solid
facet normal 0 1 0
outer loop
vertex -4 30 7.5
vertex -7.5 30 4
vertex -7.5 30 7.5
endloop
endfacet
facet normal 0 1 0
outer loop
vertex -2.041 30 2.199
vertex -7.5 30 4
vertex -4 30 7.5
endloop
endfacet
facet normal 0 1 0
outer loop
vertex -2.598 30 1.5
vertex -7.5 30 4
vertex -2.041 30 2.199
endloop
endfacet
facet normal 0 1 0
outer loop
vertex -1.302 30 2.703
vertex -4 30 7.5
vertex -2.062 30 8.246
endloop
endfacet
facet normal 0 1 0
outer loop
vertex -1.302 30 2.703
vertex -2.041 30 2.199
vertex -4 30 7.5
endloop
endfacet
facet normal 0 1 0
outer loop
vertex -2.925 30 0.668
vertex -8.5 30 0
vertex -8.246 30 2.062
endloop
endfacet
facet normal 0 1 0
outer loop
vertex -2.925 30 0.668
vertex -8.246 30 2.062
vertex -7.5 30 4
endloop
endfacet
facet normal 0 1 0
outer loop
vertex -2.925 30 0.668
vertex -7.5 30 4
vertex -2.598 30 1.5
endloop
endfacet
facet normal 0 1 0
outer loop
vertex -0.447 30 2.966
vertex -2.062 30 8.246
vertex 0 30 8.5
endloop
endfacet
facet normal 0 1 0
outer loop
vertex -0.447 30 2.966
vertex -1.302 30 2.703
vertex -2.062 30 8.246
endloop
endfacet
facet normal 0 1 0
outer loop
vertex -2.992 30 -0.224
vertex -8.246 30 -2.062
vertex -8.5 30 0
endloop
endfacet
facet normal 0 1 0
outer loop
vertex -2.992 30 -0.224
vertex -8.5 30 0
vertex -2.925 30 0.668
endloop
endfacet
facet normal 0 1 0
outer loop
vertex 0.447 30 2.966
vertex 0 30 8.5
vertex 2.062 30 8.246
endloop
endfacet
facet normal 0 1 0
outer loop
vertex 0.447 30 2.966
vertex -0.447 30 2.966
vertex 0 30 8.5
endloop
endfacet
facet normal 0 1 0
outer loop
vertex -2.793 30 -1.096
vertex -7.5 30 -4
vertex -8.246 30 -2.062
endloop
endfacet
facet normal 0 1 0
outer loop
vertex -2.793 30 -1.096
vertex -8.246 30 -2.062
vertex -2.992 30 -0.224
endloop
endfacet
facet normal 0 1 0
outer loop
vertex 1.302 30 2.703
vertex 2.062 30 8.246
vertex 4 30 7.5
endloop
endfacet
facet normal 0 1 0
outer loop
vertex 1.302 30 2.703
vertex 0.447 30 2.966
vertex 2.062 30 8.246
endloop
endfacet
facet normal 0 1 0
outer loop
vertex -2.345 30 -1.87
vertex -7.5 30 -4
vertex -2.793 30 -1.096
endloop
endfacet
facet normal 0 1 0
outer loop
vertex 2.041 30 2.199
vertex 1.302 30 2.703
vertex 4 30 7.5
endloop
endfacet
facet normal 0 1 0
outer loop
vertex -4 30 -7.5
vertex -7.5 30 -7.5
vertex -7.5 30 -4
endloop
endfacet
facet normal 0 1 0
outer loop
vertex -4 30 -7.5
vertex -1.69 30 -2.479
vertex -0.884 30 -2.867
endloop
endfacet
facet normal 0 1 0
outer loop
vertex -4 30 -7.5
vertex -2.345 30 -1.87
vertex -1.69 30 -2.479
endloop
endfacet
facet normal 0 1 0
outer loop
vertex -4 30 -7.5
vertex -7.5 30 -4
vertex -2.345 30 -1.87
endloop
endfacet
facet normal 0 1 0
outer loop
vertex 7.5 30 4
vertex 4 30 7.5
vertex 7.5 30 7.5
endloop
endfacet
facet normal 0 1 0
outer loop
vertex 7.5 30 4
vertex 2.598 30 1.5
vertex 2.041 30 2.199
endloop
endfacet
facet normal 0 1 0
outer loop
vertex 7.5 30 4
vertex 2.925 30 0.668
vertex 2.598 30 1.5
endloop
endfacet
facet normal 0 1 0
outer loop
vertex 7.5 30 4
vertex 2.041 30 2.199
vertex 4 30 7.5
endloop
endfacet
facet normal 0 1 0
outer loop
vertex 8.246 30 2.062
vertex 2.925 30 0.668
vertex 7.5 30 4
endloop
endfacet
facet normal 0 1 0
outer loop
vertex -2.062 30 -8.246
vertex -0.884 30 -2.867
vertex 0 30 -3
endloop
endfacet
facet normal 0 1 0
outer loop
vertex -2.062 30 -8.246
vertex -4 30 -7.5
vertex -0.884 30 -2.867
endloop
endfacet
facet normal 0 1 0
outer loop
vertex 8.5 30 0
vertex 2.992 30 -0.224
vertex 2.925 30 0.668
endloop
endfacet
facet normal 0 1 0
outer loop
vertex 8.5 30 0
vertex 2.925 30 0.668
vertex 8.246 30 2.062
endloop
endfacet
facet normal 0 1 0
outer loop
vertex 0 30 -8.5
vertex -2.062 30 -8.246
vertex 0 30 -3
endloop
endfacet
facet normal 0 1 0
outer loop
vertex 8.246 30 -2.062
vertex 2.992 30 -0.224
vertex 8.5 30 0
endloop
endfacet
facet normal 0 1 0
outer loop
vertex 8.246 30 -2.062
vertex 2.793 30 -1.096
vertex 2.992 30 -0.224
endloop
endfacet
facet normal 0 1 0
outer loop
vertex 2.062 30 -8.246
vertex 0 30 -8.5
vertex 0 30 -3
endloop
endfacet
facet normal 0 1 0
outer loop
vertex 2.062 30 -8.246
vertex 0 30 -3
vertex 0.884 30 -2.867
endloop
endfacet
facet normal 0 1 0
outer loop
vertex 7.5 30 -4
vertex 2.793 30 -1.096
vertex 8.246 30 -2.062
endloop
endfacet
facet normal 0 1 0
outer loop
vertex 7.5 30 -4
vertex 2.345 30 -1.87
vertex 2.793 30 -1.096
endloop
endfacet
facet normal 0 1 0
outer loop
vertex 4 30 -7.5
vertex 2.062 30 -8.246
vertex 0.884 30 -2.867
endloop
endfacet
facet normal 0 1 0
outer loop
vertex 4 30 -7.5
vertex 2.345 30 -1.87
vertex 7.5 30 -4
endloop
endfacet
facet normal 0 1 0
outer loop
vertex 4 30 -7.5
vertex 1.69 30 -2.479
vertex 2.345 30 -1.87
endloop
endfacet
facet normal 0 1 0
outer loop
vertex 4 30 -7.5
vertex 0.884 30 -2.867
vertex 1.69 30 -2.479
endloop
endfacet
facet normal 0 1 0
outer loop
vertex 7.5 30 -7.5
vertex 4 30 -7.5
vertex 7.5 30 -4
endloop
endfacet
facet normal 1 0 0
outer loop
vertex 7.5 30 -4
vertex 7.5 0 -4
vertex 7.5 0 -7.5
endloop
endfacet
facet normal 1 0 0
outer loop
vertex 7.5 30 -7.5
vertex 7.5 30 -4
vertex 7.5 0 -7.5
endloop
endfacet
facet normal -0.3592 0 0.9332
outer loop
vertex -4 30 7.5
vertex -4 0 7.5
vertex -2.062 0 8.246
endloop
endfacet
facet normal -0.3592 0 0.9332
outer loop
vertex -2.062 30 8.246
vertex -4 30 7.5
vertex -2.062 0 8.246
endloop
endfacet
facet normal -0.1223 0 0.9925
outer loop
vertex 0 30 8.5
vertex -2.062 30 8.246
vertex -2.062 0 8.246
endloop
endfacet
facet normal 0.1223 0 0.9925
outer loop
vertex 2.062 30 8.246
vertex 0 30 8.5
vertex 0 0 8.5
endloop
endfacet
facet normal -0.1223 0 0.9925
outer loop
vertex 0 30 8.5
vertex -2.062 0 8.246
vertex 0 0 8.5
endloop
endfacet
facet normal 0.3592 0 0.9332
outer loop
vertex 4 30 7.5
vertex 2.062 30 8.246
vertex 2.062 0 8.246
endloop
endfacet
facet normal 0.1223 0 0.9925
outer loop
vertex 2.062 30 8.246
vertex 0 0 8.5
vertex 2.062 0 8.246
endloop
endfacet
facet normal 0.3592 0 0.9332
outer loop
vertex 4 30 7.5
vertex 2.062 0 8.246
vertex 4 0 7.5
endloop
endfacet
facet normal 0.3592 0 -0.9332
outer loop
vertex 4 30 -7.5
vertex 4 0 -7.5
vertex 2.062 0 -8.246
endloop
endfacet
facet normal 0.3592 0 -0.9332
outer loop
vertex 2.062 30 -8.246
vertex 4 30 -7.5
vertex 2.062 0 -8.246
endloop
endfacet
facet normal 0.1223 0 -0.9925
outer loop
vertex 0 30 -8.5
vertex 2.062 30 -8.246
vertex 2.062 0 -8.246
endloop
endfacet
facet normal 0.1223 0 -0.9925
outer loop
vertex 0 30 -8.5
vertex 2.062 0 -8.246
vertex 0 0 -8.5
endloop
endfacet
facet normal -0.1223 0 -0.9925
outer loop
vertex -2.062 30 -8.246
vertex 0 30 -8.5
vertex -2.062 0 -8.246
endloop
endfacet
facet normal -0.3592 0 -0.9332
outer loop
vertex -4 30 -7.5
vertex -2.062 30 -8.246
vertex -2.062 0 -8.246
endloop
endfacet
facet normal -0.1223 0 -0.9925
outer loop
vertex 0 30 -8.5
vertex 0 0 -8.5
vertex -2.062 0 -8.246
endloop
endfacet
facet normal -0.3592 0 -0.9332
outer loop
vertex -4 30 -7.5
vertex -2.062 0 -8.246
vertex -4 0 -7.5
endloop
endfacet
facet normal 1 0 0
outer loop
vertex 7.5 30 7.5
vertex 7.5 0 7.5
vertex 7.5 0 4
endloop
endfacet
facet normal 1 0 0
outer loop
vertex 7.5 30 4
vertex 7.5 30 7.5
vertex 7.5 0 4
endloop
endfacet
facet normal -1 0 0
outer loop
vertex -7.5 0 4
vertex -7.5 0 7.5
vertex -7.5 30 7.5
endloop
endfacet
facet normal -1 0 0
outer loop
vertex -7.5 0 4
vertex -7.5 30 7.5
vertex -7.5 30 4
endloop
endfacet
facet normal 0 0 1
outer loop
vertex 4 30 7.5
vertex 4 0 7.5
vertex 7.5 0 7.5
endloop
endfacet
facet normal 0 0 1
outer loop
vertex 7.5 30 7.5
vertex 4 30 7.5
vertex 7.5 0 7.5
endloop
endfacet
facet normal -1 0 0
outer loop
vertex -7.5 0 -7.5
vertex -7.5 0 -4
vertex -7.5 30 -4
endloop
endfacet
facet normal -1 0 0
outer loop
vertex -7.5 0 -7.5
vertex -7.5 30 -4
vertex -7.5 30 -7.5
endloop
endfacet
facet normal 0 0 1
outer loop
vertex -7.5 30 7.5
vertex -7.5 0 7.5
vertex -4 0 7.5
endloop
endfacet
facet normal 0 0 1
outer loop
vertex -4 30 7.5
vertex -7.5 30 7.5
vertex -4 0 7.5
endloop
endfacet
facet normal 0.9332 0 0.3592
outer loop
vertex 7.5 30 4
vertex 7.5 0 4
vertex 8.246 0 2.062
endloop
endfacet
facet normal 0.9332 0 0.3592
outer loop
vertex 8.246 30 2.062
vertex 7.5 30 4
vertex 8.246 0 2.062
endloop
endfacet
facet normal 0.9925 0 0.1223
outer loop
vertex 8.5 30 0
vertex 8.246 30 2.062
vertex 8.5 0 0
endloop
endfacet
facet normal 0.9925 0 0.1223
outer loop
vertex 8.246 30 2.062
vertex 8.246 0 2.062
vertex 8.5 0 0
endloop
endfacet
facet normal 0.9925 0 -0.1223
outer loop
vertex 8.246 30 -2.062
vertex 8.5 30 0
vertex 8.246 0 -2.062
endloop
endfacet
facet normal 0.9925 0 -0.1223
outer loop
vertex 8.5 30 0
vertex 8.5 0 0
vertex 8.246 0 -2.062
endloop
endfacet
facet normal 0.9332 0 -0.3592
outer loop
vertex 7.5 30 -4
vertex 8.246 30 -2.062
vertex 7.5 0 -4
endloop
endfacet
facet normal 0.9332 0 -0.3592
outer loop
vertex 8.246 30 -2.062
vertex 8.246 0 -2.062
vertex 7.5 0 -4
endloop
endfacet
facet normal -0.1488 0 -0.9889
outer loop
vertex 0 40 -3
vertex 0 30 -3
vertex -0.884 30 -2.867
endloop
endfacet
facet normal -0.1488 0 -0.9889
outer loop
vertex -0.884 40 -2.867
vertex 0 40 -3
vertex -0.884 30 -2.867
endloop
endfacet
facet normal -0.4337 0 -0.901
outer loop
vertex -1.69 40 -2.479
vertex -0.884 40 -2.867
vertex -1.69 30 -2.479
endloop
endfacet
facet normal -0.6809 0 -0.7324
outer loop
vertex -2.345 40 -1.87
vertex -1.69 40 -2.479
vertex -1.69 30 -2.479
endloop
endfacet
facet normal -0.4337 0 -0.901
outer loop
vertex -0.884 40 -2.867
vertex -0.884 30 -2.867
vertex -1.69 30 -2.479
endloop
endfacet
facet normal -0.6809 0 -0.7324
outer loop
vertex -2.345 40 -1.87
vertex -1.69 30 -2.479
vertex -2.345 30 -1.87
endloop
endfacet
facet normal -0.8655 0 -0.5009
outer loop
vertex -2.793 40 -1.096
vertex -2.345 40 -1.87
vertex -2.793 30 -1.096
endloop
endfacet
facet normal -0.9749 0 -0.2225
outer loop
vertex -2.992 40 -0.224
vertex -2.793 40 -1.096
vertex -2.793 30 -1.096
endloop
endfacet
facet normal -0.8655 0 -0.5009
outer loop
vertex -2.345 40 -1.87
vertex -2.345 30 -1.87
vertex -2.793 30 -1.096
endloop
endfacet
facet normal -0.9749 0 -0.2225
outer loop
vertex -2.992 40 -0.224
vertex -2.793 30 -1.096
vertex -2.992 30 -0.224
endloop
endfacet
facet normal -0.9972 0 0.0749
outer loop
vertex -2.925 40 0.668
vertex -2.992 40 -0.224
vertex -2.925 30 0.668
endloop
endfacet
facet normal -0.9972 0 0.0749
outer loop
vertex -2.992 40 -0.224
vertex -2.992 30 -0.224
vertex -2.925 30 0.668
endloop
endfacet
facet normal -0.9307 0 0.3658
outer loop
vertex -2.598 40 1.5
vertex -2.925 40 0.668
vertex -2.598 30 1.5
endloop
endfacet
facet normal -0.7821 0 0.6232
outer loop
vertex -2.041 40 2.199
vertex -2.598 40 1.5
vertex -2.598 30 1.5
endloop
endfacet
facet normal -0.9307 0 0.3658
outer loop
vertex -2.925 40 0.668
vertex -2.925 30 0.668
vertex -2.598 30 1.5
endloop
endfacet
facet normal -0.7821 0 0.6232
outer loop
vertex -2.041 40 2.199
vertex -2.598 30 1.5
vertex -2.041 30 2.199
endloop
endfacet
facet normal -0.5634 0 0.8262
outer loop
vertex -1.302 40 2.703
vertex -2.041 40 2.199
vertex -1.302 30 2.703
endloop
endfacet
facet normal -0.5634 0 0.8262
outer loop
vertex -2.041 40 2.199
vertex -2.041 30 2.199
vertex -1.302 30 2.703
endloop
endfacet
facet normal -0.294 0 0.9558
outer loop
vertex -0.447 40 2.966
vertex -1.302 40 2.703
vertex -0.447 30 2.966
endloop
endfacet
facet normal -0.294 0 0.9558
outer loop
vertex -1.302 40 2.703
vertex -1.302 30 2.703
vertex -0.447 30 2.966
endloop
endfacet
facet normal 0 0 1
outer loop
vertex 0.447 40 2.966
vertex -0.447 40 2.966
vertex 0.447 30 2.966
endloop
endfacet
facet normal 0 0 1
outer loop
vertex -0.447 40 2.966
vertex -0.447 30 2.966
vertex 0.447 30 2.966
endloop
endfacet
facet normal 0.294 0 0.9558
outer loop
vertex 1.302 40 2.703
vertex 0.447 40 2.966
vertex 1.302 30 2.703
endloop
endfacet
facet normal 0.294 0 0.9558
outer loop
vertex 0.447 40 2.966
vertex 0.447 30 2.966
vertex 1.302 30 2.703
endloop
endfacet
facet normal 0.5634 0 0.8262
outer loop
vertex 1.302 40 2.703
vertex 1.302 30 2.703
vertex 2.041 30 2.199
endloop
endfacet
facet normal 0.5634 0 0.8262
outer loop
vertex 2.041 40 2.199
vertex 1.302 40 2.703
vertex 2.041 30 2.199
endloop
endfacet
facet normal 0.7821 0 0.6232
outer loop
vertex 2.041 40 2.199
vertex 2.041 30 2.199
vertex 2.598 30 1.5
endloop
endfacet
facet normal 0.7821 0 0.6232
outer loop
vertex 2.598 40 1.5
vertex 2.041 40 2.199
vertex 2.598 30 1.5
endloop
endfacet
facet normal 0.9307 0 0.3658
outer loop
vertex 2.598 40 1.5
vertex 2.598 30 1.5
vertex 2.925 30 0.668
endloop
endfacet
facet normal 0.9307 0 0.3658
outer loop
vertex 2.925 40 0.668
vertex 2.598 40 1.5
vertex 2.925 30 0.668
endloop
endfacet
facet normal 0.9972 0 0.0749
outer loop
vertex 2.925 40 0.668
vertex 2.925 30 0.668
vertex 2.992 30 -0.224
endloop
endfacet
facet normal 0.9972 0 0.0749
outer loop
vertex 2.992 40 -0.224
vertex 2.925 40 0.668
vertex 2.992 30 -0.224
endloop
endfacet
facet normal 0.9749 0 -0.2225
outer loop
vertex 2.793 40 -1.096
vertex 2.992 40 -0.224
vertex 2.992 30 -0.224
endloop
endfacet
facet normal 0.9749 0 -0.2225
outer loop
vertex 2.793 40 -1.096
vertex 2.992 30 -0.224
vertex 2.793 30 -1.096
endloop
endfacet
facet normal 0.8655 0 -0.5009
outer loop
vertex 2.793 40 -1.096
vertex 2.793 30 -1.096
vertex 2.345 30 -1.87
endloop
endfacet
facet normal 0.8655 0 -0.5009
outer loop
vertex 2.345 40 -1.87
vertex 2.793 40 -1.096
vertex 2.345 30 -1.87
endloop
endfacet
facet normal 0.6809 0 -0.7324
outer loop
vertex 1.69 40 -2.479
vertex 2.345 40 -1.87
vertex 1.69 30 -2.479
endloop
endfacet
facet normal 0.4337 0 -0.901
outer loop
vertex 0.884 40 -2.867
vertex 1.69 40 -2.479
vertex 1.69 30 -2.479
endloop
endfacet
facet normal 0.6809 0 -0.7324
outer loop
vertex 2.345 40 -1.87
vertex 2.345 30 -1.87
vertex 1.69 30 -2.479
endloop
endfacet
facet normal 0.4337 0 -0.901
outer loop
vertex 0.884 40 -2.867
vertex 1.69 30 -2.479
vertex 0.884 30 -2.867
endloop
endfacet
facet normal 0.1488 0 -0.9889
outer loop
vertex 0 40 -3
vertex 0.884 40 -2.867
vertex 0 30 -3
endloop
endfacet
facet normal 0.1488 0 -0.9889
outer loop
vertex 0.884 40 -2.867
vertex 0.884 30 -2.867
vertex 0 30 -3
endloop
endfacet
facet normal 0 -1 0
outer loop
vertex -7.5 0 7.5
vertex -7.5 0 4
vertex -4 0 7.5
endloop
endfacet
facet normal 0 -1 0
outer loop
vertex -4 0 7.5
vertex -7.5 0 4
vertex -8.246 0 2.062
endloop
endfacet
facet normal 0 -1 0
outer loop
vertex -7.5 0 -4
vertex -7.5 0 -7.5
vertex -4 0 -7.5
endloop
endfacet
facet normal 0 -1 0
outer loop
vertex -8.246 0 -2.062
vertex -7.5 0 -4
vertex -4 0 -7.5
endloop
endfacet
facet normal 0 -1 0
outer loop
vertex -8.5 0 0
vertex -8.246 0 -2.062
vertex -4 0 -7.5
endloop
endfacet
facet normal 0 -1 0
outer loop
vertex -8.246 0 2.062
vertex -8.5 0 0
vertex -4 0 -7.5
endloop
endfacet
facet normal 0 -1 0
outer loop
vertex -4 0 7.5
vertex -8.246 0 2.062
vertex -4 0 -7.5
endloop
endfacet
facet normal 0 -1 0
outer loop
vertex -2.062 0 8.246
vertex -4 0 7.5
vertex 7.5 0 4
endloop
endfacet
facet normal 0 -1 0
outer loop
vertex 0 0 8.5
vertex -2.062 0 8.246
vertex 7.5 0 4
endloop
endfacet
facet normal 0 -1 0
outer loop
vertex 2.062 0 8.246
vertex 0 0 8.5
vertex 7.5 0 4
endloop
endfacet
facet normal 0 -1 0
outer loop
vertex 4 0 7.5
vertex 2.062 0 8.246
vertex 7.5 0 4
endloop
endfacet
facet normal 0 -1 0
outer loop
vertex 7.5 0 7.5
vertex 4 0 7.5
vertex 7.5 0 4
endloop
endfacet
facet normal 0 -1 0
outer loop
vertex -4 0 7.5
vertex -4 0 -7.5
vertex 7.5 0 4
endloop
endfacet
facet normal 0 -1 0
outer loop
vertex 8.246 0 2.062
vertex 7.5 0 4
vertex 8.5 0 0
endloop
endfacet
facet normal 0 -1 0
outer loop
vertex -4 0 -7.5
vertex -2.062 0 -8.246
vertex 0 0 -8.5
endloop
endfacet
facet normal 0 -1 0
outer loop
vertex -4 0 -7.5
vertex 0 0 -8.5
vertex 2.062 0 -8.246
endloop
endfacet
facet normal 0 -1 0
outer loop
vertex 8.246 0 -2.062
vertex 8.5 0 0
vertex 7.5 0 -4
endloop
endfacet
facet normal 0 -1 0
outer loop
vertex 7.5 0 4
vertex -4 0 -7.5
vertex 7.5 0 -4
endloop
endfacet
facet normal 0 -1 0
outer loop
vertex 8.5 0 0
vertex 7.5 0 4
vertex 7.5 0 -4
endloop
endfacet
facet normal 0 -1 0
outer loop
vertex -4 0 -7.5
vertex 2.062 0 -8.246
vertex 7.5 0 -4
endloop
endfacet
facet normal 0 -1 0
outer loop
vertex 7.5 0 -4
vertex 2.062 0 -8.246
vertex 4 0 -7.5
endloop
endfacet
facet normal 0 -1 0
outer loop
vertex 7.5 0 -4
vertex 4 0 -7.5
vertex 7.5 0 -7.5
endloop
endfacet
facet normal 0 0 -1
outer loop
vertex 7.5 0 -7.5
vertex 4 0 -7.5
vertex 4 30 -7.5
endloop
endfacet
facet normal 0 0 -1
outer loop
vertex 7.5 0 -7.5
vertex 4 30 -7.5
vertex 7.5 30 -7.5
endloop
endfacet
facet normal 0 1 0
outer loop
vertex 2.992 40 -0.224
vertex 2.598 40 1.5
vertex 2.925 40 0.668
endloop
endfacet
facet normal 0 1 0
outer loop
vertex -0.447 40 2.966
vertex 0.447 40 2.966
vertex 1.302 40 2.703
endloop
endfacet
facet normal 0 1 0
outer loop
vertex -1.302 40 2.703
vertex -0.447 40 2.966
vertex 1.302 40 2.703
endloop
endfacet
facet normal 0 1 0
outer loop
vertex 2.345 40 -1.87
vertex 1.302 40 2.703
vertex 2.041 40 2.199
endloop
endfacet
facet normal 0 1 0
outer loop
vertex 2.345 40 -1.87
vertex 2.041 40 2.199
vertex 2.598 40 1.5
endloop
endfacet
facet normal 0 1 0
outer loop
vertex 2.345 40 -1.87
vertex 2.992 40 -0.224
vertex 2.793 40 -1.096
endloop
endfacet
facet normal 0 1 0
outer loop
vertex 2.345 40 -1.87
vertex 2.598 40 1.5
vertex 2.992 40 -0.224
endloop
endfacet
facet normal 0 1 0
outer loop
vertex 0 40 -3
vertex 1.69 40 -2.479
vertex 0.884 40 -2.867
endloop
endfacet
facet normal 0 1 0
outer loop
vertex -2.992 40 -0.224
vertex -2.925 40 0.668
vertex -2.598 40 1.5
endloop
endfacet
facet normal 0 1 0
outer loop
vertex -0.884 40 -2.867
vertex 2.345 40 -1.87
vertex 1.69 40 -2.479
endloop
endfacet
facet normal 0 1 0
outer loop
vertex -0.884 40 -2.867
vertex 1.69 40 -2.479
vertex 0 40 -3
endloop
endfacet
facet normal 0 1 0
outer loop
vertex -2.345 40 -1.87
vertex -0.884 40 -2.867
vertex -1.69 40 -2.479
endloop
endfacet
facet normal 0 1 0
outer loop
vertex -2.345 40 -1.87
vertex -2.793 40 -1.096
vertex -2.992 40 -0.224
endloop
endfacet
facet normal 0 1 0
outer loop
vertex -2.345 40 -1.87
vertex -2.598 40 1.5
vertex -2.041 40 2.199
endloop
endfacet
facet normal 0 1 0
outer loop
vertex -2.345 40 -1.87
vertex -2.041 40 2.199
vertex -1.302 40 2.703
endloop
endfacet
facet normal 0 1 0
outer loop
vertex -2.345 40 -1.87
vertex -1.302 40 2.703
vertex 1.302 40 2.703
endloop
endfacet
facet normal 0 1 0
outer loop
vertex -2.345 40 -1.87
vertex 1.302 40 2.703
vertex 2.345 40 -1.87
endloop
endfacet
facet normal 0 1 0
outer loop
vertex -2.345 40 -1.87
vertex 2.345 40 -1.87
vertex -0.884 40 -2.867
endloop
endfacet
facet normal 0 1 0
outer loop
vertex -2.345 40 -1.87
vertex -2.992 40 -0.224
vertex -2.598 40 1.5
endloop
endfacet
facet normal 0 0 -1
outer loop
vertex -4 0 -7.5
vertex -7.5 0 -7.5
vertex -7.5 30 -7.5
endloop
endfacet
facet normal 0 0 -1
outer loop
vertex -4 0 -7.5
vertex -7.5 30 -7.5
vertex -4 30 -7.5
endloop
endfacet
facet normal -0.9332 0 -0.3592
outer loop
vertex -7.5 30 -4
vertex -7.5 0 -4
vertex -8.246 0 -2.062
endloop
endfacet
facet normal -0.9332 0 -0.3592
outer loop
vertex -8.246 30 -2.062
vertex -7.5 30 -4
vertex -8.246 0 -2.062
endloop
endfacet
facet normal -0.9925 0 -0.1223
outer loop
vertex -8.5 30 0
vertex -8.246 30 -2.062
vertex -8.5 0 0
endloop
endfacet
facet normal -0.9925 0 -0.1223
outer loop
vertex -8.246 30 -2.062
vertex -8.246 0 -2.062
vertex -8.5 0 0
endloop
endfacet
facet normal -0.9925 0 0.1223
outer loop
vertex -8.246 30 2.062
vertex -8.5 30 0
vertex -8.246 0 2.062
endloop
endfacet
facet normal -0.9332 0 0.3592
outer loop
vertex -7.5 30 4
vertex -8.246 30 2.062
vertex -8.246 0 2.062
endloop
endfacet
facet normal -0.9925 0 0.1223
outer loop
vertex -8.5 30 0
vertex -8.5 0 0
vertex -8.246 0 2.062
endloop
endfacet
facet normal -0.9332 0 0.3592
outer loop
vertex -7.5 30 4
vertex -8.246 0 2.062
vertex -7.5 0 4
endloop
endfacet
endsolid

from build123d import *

# Parameters (mm, degrees)
SKETCH1_R           = 8.5
SKETCH1_W           = 15
SKETCH1_H           = 15
BOSS_EXTRUDE1_DEPTH = 30
SKETCH2_R           = 3
BOSS_EXTRUDE2_DEPTH = 10


with BuildPart() as part:
    # Sketch1 → Boss-Extrude1 (new body)
    with BuildSketch(Plane(origin=(0, 0, 0), x_dir=(1, 0, 0), z_dir=(0, 1, 0))):
        Circle(SKETCH1_R)
        Rectangle(SKETCH1_W, SKETCH1_H)
    extrude(amount=BOSS_EXTRUDE1_DEPTH)

    # Sketch2 → Boss-Extrude2 (add)
    with BuildSketch(Plane(origin=(0, 30, 0), x_dir=(1, 0, 0), z_dir=(0, 1, 0))):
        with Locations(Location((0, 0, 0), (0, 0, 90))):
            Circle(SKETCH2_R)
    extrude(amount=BOSS_EXTRUDE2_DEPTH)


solid = part.part
